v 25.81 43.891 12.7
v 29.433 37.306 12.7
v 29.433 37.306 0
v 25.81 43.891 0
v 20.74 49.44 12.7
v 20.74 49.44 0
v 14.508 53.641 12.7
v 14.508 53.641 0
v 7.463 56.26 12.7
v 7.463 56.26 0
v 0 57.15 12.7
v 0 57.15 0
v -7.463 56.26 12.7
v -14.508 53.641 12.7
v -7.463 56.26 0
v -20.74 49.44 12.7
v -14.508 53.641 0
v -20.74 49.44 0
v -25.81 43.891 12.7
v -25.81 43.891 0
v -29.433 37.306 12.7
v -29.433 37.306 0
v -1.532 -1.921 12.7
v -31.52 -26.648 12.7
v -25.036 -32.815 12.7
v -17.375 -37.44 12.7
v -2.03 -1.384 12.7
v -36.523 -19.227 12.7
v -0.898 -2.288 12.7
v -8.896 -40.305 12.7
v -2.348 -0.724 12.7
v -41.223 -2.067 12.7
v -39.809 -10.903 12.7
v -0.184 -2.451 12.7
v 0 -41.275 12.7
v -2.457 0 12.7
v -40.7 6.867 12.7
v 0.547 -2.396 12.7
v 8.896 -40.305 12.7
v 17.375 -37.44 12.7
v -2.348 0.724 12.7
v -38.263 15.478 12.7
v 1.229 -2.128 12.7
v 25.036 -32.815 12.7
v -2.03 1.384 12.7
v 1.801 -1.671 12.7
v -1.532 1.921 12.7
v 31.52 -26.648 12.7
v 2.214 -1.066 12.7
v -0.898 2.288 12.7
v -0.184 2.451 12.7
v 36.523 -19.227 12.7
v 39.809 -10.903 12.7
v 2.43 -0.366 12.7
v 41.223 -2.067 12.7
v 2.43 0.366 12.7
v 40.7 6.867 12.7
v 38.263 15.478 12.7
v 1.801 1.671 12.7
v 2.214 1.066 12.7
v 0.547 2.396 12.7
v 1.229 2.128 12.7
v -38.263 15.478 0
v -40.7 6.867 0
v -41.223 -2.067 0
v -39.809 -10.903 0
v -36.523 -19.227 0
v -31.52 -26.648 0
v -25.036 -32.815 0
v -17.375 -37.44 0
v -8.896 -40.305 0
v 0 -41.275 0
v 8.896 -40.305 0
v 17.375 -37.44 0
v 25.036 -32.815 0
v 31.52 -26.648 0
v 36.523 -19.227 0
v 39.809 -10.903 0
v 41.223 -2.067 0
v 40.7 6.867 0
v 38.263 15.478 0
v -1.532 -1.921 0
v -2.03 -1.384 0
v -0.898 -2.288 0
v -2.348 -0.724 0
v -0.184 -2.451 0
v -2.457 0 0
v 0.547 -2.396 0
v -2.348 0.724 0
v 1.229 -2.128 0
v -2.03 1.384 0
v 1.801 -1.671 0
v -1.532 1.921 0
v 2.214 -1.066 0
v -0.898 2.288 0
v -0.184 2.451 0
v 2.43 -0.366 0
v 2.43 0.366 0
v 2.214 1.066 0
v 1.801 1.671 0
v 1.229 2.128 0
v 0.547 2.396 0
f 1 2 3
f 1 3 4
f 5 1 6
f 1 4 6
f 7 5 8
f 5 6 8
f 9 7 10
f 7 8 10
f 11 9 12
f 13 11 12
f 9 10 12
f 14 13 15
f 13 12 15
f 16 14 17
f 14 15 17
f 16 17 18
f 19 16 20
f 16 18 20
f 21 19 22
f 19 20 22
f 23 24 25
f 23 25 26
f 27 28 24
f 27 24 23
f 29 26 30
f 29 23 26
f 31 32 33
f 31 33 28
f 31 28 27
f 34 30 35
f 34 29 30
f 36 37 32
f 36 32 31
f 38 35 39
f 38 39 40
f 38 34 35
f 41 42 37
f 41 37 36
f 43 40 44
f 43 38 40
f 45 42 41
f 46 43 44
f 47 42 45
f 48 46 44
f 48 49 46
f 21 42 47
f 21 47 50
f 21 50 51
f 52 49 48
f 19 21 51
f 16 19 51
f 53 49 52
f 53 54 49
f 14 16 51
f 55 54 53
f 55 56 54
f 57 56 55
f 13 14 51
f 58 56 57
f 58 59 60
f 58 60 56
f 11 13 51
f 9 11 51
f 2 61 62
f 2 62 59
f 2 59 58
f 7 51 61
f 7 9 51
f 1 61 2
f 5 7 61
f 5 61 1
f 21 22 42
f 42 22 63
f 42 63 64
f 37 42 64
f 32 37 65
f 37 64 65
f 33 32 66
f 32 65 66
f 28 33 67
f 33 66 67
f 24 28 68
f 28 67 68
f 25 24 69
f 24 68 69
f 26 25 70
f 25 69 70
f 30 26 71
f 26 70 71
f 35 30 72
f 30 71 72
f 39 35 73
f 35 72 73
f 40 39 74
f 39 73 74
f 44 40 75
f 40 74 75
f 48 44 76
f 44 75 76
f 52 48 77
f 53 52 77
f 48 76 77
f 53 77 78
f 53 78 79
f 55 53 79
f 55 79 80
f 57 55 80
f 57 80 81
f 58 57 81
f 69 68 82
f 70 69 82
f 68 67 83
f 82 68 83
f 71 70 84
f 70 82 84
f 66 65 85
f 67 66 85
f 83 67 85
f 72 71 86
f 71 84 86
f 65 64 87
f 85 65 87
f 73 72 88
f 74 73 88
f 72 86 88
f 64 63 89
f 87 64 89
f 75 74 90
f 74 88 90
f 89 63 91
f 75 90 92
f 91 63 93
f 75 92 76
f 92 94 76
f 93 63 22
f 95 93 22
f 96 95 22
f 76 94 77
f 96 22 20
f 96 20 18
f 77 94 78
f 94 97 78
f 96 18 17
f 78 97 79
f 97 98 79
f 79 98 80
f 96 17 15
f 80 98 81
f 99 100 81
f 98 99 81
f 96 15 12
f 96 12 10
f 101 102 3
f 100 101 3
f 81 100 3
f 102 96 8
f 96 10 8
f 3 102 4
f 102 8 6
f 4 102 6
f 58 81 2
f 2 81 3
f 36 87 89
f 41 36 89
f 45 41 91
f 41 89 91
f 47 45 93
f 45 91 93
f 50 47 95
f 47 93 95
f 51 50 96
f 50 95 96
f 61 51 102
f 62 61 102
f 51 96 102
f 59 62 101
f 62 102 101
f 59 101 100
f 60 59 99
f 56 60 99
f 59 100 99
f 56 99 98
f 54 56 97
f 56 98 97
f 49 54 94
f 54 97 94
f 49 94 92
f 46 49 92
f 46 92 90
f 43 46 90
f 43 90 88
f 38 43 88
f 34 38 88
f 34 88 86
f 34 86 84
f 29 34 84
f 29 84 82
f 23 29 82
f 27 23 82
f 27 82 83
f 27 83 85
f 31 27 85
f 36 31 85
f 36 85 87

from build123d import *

# Parameters (mm, degrees)
BOSS_EXTRUDE1_DEPTH          = 12.7
F_10_0_1935_DIAMETER_HOLE1_D = 4.9149


with BuildPart() as part:
    # Sketch1 → Boss-Extrude1 (new body)
    with BuildSketch(Plane.XY):
        with BuildLine():
            ThreePointArc((-38.262949069, 15.478125), (0, -41.275), (38.262949069, 15.478125))
            Line((38.262949069, 15.478125), (29.433037746, 37.30625))
            ThreePointArc((29.433037746, 37.30625), (0, 57.15), (-29.433037746, 37.30625))
            Line((-29.433037746, 37.30625), (-38.262949069, 15.478125))
        make_face()
    extrude(amount=BOSS_EXTRUDE1_DEPTH)

    # #10 (0.1935) Diameter Hole1 (through all)
    with Locations(Plane.XY.offset(12.7)):
        with Locations((0, 0)):
            Hole(F_10_0_1935_DIAMETER_HOLE1_D / 2)


solid = part.part
